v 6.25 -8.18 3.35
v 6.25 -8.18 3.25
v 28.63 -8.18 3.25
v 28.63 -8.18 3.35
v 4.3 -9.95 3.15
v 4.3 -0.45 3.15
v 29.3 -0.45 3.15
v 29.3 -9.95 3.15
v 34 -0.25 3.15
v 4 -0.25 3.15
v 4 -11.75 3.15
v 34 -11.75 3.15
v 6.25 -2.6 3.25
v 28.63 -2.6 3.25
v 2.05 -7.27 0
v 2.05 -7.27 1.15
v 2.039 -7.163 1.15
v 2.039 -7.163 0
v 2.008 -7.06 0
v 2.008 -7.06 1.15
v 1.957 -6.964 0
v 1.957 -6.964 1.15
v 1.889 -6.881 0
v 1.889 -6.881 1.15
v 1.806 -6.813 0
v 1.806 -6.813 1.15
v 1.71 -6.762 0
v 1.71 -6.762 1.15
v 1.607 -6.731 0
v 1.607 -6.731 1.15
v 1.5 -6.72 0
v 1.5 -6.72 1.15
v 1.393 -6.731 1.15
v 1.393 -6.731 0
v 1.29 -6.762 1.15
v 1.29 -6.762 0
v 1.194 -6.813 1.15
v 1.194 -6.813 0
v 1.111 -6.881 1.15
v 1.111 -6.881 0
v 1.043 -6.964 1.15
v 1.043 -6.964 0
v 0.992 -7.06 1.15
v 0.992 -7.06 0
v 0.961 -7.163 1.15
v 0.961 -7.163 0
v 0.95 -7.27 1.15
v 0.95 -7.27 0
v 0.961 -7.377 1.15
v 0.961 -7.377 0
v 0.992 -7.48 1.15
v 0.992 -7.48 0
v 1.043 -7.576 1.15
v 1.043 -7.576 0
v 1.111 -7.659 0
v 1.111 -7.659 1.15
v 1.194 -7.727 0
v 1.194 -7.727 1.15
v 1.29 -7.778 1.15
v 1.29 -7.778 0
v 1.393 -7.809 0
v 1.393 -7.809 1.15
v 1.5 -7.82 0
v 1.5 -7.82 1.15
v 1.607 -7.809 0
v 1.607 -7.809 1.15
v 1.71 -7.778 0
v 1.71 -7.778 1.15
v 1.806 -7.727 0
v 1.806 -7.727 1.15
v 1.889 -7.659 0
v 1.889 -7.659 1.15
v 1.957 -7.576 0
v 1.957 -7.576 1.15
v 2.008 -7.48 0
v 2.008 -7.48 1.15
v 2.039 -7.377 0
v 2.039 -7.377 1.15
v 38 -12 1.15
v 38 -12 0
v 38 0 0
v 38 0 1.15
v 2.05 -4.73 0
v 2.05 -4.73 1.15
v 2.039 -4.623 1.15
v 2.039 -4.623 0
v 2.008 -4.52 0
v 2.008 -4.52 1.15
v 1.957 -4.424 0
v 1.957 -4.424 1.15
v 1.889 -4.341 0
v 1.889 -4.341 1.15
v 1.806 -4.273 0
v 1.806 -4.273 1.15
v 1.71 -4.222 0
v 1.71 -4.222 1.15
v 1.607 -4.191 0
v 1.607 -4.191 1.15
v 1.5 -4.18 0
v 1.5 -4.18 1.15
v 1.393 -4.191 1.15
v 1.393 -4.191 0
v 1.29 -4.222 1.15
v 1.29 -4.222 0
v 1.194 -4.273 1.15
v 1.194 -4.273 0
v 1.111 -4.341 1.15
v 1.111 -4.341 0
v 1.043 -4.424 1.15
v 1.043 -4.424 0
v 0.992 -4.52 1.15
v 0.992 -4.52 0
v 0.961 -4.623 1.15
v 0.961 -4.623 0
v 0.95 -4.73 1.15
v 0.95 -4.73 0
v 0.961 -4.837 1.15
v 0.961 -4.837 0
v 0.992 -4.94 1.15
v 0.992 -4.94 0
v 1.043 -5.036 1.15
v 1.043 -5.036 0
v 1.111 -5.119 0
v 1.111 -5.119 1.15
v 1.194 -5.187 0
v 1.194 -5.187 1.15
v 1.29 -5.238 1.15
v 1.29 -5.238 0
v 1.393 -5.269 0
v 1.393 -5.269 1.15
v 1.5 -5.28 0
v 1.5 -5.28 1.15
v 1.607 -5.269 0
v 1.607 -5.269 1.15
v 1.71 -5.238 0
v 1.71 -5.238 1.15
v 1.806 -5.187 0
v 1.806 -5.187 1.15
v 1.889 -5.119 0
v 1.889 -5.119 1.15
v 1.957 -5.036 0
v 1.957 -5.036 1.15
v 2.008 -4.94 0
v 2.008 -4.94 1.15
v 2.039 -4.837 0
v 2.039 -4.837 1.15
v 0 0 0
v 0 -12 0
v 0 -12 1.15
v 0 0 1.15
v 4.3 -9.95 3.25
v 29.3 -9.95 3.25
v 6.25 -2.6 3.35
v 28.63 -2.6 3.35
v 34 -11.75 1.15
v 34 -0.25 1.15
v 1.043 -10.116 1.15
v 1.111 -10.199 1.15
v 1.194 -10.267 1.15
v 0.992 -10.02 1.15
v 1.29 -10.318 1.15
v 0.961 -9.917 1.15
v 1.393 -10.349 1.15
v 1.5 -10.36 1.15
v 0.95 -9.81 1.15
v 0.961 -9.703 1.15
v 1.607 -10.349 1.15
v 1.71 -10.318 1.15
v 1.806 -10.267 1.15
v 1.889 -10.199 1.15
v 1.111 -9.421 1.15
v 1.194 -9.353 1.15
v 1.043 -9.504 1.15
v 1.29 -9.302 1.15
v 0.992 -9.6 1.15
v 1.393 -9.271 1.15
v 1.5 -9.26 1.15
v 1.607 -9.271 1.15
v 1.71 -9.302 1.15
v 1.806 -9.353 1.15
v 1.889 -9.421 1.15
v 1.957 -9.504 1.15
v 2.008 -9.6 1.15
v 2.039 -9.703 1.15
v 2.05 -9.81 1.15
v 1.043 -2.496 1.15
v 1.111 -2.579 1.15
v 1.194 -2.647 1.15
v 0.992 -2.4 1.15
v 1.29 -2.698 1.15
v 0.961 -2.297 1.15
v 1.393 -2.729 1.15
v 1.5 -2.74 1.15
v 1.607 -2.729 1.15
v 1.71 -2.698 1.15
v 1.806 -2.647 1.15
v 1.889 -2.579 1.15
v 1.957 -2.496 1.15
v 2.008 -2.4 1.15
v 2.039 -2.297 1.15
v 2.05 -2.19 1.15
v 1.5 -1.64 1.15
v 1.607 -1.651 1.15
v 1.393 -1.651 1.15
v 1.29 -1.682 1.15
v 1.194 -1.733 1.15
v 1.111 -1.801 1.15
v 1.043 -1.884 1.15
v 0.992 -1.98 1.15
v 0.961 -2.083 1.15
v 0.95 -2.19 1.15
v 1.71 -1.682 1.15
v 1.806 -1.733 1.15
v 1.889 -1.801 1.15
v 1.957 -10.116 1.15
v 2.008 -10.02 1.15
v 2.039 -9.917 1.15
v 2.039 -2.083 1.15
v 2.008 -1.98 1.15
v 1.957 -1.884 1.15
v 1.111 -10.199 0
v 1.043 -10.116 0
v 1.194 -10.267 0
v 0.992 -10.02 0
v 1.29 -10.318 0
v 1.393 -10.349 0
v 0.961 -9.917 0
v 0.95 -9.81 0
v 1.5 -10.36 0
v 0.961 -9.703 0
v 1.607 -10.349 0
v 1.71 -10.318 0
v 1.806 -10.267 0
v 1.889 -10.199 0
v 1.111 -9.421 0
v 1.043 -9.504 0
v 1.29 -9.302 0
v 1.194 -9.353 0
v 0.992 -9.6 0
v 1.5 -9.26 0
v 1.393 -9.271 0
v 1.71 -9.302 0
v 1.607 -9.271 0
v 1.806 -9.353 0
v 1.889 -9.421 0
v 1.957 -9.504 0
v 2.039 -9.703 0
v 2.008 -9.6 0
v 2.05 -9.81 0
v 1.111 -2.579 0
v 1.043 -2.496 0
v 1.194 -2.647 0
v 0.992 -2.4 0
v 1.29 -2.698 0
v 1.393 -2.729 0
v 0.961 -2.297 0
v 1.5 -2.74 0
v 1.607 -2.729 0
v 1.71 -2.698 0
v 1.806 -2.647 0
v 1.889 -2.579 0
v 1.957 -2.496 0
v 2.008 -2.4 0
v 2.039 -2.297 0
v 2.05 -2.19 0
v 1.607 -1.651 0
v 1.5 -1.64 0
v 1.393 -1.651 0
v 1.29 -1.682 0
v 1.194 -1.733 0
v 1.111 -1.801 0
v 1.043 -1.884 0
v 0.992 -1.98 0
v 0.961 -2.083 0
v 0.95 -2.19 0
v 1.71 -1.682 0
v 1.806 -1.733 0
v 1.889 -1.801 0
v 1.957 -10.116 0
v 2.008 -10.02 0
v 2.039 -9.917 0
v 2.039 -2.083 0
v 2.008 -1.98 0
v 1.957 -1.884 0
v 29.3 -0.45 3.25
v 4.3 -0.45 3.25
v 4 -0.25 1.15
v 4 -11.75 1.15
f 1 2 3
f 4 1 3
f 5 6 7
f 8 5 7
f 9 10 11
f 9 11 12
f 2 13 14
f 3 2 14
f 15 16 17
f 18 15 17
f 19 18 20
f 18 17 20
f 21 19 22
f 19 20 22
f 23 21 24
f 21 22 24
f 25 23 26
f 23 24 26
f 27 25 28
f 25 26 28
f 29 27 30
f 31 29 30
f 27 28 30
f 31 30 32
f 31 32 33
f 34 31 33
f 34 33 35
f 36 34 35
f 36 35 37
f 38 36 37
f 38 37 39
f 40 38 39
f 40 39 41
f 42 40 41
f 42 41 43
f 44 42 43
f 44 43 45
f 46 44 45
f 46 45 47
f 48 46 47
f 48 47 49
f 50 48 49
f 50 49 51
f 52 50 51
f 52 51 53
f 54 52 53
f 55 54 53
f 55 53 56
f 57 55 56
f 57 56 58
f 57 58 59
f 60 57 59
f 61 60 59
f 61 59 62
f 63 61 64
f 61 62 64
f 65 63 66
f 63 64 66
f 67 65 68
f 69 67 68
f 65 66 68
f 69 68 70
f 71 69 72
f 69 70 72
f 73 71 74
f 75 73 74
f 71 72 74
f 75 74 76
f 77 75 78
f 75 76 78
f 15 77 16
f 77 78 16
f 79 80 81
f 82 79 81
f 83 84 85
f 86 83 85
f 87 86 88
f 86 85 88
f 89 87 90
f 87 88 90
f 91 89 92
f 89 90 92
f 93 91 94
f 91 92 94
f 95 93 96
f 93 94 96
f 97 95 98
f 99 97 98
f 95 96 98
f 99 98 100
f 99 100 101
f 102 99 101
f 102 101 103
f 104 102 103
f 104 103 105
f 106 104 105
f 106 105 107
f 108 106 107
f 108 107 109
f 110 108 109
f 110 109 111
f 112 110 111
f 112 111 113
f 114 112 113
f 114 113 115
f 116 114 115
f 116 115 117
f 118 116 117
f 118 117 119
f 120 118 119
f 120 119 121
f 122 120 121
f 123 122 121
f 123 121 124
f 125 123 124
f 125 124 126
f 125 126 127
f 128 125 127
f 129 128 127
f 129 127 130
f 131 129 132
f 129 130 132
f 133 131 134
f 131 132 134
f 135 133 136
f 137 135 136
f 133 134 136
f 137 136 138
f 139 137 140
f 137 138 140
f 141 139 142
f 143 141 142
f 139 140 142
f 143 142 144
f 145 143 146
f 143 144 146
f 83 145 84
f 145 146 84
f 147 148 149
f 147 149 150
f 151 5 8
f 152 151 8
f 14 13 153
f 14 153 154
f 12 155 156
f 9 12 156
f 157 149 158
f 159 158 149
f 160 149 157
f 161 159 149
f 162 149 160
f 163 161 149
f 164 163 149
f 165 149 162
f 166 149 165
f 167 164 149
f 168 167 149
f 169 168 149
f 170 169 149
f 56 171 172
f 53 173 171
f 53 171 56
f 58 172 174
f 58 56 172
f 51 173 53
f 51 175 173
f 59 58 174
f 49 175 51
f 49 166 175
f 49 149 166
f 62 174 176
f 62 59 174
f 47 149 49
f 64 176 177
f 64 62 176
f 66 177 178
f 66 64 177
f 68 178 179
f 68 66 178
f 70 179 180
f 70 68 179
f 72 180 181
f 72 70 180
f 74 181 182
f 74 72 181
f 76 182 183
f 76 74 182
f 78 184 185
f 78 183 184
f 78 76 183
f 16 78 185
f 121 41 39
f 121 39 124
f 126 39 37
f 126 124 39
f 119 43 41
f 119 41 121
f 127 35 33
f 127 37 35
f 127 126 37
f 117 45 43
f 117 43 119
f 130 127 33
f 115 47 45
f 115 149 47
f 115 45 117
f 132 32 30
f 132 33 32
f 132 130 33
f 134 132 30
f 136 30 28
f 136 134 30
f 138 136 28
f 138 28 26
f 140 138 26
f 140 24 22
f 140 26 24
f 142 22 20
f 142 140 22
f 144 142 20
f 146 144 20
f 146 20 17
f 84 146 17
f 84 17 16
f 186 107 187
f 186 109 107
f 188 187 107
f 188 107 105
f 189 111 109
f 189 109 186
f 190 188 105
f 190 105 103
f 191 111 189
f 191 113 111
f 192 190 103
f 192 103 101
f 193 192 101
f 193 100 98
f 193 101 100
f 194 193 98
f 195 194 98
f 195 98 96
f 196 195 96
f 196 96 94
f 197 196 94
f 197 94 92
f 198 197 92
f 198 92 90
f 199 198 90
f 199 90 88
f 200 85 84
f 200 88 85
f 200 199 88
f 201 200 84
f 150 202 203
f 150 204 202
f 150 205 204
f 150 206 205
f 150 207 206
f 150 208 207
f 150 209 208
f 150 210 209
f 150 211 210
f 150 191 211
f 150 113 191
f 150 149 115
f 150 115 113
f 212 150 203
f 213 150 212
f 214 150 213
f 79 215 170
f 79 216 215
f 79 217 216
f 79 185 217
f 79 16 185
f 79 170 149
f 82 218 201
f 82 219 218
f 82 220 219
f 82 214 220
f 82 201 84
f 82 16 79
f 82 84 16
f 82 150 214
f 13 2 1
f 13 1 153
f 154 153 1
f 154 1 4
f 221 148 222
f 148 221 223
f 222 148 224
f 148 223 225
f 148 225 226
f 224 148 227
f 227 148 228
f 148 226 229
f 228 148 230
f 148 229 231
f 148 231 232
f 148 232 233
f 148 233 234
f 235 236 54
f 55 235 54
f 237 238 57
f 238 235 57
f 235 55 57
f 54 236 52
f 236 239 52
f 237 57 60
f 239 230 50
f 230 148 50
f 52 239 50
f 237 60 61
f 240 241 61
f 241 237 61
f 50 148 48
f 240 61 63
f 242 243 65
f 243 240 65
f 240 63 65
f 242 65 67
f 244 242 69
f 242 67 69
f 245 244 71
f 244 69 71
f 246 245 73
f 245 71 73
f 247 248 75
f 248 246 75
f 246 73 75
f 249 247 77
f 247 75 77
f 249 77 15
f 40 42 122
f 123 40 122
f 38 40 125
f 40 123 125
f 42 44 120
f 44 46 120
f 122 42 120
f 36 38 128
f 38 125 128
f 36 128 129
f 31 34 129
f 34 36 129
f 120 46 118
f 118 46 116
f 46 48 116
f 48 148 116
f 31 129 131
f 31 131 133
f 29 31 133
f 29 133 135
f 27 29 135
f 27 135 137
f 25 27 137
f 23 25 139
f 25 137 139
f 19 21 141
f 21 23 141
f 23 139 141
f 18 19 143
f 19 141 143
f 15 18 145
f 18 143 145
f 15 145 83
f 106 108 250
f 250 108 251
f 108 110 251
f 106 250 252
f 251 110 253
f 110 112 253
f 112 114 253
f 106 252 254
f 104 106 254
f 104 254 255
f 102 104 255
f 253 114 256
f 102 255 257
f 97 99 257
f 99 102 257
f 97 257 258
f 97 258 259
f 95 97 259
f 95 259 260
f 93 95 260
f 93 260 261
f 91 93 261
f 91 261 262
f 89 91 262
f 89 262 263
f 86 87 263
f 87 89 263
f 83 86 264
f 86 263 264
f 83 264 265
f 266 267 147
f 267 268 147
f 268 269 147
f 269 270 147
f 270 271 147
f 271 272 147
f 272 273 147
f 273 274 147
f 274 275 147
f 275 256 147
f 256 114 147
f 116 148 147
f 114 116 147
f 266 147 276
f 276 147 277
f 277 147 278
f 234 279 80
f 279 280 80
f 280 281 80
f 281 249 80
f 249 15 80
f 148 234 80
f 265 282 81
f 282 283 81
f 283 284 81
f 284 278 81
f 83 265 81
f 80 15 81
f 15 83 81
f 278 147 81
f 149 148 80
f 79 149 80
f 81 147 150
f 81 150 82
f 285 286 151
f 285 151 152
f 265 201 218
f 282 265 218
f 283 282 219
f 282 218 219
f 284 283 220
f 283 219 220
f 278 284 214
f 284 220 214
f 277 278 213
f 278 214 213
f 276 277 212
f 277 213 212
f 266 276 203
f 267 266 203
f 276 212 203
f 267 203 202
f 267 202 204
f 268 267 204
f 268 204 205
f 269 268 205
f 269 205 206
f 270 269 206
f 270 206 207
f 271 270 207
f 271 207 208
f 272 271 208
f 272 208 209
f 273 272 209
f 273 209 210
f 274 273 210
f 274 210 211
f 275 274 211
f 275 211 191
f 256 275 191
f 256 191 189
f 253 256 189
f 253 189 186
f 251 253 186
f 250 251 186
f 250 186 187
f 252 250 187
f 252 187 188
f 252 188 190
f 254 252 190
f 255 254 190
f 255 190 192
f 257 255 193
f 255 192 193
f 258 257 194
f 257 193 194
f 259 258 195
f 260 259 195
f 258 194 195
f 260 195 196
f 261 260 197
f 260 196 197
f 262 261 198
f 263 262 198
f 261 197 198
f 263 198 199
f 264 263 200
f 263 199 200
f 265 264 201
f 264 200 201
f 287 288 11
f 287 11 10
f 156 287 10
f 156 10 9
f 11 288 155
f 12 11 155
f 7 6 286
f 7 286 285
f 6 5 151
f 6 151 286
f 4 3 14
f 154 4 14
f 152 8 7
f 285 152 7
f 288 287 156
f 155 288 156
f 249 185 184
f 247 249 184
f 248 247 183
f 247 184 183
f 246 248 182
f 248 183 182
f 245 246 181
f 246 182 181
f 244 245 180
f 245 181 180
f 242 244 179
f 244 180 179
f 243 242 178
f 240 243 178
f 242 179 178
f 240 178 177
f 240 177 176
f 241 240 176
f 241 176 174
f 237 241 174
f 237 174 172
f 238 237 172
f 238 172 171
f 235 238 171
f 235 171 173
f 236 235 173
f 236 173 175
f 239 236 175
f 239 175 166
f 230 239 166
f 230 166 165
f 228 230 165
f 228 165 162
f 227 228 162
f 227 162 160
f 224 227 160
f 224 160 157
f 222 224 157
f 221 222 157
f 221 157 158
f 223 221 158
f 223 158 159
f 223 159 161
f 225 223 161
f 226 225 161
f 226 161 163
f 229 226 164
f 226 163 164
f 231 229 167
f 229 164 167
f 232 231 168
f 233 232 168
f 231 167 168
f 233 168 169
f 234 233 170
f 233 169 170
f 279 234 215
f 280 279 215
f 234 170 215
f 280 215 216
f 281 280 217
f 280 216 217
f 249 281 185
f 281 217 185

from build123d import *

# Parameters (mm, degrees)
SKETCH_W     = 38
SKETCH_H     = 12
PAD_DEPTH    = 1.15
SKETCH001_R  = 0.55
POCKET_DEPTH = 1.151
SKETCH002_W  = 30
SKETCH002_H  = 11.5
PAD001_DEPTH = 2
SKETCH003_W  = 25
SKETCH003_H  = 9.5
PAD002_DEPTH = 0.1
SKETCH004_W  = 22.38
SKETCH004_H  = 5.58
PAD003_DEPTH = 0.1


with BuildPart() as pcb:
    # Sketch → Pad (new body)
    with BuildSketch(Plane.XY):
        with Locations((19, -6)):
            Rectangle(SKETCH_W, SKETCH_H)
    extrude(amount=PAD_DEPTH)

    # Sketch001 (on Face6 of Pad) → Pocket (cut, through all)
    with BuildSketch(Plane.XY.offset(1.15)):
        with Locations((1.5, -2.19)):
            Circle(SKETCH001_R)
        with Locations((1.5, -9.81)):
            Circle(SKETCH001_R)
        with Locations((1.5, -4.73)):
            Circle(SKETCH001_R)
        with Locations((1.5, -7.27)):
            Circle(SKETCH001_R)
    extrude(amount=-POCKET_DEPTH, mode=Mode.SUBTRACT)


with BuildPart() as glass:
    # Sketch002 (on Face1 of CopyPocket) → Pad001 (new body)
    with BuildSketch(Plane.XY.offset(1.15)):
        with Locations((19, -6)):
            Rectangle(SKETCH002_W, SKETCH002_H)
    extrude(amount=PAD001_DEPTH)


with BuildPart() as blackfilm:
    # Sketch003 (on Face1 of CopyPad001) → Pad002 (new body)
    with BuildSketch(Plane.XY.offset(3.15)):
        with Locations((16.8, -5.2)):
            Rectangle(SKETCH003_W, SKETCH003_H)
    extrude(amount=PAD002_DEPTH)


with BuildPart() as pixel_area:
    # Sketch004 (on Face1 of CopyPad002) → Pad003 (new body)
    with BuildSketch(Plane.XY.offset(3.25)):
        with Locations((17.44, -5.39)):
            Rectangle(SKETCH004_W, SKETCH004_H)
    extrude(amount=PAD003_DEPTH)


solid = Compound([pcb.part, glass.part, blackfilm.part, pixel_area.part])
